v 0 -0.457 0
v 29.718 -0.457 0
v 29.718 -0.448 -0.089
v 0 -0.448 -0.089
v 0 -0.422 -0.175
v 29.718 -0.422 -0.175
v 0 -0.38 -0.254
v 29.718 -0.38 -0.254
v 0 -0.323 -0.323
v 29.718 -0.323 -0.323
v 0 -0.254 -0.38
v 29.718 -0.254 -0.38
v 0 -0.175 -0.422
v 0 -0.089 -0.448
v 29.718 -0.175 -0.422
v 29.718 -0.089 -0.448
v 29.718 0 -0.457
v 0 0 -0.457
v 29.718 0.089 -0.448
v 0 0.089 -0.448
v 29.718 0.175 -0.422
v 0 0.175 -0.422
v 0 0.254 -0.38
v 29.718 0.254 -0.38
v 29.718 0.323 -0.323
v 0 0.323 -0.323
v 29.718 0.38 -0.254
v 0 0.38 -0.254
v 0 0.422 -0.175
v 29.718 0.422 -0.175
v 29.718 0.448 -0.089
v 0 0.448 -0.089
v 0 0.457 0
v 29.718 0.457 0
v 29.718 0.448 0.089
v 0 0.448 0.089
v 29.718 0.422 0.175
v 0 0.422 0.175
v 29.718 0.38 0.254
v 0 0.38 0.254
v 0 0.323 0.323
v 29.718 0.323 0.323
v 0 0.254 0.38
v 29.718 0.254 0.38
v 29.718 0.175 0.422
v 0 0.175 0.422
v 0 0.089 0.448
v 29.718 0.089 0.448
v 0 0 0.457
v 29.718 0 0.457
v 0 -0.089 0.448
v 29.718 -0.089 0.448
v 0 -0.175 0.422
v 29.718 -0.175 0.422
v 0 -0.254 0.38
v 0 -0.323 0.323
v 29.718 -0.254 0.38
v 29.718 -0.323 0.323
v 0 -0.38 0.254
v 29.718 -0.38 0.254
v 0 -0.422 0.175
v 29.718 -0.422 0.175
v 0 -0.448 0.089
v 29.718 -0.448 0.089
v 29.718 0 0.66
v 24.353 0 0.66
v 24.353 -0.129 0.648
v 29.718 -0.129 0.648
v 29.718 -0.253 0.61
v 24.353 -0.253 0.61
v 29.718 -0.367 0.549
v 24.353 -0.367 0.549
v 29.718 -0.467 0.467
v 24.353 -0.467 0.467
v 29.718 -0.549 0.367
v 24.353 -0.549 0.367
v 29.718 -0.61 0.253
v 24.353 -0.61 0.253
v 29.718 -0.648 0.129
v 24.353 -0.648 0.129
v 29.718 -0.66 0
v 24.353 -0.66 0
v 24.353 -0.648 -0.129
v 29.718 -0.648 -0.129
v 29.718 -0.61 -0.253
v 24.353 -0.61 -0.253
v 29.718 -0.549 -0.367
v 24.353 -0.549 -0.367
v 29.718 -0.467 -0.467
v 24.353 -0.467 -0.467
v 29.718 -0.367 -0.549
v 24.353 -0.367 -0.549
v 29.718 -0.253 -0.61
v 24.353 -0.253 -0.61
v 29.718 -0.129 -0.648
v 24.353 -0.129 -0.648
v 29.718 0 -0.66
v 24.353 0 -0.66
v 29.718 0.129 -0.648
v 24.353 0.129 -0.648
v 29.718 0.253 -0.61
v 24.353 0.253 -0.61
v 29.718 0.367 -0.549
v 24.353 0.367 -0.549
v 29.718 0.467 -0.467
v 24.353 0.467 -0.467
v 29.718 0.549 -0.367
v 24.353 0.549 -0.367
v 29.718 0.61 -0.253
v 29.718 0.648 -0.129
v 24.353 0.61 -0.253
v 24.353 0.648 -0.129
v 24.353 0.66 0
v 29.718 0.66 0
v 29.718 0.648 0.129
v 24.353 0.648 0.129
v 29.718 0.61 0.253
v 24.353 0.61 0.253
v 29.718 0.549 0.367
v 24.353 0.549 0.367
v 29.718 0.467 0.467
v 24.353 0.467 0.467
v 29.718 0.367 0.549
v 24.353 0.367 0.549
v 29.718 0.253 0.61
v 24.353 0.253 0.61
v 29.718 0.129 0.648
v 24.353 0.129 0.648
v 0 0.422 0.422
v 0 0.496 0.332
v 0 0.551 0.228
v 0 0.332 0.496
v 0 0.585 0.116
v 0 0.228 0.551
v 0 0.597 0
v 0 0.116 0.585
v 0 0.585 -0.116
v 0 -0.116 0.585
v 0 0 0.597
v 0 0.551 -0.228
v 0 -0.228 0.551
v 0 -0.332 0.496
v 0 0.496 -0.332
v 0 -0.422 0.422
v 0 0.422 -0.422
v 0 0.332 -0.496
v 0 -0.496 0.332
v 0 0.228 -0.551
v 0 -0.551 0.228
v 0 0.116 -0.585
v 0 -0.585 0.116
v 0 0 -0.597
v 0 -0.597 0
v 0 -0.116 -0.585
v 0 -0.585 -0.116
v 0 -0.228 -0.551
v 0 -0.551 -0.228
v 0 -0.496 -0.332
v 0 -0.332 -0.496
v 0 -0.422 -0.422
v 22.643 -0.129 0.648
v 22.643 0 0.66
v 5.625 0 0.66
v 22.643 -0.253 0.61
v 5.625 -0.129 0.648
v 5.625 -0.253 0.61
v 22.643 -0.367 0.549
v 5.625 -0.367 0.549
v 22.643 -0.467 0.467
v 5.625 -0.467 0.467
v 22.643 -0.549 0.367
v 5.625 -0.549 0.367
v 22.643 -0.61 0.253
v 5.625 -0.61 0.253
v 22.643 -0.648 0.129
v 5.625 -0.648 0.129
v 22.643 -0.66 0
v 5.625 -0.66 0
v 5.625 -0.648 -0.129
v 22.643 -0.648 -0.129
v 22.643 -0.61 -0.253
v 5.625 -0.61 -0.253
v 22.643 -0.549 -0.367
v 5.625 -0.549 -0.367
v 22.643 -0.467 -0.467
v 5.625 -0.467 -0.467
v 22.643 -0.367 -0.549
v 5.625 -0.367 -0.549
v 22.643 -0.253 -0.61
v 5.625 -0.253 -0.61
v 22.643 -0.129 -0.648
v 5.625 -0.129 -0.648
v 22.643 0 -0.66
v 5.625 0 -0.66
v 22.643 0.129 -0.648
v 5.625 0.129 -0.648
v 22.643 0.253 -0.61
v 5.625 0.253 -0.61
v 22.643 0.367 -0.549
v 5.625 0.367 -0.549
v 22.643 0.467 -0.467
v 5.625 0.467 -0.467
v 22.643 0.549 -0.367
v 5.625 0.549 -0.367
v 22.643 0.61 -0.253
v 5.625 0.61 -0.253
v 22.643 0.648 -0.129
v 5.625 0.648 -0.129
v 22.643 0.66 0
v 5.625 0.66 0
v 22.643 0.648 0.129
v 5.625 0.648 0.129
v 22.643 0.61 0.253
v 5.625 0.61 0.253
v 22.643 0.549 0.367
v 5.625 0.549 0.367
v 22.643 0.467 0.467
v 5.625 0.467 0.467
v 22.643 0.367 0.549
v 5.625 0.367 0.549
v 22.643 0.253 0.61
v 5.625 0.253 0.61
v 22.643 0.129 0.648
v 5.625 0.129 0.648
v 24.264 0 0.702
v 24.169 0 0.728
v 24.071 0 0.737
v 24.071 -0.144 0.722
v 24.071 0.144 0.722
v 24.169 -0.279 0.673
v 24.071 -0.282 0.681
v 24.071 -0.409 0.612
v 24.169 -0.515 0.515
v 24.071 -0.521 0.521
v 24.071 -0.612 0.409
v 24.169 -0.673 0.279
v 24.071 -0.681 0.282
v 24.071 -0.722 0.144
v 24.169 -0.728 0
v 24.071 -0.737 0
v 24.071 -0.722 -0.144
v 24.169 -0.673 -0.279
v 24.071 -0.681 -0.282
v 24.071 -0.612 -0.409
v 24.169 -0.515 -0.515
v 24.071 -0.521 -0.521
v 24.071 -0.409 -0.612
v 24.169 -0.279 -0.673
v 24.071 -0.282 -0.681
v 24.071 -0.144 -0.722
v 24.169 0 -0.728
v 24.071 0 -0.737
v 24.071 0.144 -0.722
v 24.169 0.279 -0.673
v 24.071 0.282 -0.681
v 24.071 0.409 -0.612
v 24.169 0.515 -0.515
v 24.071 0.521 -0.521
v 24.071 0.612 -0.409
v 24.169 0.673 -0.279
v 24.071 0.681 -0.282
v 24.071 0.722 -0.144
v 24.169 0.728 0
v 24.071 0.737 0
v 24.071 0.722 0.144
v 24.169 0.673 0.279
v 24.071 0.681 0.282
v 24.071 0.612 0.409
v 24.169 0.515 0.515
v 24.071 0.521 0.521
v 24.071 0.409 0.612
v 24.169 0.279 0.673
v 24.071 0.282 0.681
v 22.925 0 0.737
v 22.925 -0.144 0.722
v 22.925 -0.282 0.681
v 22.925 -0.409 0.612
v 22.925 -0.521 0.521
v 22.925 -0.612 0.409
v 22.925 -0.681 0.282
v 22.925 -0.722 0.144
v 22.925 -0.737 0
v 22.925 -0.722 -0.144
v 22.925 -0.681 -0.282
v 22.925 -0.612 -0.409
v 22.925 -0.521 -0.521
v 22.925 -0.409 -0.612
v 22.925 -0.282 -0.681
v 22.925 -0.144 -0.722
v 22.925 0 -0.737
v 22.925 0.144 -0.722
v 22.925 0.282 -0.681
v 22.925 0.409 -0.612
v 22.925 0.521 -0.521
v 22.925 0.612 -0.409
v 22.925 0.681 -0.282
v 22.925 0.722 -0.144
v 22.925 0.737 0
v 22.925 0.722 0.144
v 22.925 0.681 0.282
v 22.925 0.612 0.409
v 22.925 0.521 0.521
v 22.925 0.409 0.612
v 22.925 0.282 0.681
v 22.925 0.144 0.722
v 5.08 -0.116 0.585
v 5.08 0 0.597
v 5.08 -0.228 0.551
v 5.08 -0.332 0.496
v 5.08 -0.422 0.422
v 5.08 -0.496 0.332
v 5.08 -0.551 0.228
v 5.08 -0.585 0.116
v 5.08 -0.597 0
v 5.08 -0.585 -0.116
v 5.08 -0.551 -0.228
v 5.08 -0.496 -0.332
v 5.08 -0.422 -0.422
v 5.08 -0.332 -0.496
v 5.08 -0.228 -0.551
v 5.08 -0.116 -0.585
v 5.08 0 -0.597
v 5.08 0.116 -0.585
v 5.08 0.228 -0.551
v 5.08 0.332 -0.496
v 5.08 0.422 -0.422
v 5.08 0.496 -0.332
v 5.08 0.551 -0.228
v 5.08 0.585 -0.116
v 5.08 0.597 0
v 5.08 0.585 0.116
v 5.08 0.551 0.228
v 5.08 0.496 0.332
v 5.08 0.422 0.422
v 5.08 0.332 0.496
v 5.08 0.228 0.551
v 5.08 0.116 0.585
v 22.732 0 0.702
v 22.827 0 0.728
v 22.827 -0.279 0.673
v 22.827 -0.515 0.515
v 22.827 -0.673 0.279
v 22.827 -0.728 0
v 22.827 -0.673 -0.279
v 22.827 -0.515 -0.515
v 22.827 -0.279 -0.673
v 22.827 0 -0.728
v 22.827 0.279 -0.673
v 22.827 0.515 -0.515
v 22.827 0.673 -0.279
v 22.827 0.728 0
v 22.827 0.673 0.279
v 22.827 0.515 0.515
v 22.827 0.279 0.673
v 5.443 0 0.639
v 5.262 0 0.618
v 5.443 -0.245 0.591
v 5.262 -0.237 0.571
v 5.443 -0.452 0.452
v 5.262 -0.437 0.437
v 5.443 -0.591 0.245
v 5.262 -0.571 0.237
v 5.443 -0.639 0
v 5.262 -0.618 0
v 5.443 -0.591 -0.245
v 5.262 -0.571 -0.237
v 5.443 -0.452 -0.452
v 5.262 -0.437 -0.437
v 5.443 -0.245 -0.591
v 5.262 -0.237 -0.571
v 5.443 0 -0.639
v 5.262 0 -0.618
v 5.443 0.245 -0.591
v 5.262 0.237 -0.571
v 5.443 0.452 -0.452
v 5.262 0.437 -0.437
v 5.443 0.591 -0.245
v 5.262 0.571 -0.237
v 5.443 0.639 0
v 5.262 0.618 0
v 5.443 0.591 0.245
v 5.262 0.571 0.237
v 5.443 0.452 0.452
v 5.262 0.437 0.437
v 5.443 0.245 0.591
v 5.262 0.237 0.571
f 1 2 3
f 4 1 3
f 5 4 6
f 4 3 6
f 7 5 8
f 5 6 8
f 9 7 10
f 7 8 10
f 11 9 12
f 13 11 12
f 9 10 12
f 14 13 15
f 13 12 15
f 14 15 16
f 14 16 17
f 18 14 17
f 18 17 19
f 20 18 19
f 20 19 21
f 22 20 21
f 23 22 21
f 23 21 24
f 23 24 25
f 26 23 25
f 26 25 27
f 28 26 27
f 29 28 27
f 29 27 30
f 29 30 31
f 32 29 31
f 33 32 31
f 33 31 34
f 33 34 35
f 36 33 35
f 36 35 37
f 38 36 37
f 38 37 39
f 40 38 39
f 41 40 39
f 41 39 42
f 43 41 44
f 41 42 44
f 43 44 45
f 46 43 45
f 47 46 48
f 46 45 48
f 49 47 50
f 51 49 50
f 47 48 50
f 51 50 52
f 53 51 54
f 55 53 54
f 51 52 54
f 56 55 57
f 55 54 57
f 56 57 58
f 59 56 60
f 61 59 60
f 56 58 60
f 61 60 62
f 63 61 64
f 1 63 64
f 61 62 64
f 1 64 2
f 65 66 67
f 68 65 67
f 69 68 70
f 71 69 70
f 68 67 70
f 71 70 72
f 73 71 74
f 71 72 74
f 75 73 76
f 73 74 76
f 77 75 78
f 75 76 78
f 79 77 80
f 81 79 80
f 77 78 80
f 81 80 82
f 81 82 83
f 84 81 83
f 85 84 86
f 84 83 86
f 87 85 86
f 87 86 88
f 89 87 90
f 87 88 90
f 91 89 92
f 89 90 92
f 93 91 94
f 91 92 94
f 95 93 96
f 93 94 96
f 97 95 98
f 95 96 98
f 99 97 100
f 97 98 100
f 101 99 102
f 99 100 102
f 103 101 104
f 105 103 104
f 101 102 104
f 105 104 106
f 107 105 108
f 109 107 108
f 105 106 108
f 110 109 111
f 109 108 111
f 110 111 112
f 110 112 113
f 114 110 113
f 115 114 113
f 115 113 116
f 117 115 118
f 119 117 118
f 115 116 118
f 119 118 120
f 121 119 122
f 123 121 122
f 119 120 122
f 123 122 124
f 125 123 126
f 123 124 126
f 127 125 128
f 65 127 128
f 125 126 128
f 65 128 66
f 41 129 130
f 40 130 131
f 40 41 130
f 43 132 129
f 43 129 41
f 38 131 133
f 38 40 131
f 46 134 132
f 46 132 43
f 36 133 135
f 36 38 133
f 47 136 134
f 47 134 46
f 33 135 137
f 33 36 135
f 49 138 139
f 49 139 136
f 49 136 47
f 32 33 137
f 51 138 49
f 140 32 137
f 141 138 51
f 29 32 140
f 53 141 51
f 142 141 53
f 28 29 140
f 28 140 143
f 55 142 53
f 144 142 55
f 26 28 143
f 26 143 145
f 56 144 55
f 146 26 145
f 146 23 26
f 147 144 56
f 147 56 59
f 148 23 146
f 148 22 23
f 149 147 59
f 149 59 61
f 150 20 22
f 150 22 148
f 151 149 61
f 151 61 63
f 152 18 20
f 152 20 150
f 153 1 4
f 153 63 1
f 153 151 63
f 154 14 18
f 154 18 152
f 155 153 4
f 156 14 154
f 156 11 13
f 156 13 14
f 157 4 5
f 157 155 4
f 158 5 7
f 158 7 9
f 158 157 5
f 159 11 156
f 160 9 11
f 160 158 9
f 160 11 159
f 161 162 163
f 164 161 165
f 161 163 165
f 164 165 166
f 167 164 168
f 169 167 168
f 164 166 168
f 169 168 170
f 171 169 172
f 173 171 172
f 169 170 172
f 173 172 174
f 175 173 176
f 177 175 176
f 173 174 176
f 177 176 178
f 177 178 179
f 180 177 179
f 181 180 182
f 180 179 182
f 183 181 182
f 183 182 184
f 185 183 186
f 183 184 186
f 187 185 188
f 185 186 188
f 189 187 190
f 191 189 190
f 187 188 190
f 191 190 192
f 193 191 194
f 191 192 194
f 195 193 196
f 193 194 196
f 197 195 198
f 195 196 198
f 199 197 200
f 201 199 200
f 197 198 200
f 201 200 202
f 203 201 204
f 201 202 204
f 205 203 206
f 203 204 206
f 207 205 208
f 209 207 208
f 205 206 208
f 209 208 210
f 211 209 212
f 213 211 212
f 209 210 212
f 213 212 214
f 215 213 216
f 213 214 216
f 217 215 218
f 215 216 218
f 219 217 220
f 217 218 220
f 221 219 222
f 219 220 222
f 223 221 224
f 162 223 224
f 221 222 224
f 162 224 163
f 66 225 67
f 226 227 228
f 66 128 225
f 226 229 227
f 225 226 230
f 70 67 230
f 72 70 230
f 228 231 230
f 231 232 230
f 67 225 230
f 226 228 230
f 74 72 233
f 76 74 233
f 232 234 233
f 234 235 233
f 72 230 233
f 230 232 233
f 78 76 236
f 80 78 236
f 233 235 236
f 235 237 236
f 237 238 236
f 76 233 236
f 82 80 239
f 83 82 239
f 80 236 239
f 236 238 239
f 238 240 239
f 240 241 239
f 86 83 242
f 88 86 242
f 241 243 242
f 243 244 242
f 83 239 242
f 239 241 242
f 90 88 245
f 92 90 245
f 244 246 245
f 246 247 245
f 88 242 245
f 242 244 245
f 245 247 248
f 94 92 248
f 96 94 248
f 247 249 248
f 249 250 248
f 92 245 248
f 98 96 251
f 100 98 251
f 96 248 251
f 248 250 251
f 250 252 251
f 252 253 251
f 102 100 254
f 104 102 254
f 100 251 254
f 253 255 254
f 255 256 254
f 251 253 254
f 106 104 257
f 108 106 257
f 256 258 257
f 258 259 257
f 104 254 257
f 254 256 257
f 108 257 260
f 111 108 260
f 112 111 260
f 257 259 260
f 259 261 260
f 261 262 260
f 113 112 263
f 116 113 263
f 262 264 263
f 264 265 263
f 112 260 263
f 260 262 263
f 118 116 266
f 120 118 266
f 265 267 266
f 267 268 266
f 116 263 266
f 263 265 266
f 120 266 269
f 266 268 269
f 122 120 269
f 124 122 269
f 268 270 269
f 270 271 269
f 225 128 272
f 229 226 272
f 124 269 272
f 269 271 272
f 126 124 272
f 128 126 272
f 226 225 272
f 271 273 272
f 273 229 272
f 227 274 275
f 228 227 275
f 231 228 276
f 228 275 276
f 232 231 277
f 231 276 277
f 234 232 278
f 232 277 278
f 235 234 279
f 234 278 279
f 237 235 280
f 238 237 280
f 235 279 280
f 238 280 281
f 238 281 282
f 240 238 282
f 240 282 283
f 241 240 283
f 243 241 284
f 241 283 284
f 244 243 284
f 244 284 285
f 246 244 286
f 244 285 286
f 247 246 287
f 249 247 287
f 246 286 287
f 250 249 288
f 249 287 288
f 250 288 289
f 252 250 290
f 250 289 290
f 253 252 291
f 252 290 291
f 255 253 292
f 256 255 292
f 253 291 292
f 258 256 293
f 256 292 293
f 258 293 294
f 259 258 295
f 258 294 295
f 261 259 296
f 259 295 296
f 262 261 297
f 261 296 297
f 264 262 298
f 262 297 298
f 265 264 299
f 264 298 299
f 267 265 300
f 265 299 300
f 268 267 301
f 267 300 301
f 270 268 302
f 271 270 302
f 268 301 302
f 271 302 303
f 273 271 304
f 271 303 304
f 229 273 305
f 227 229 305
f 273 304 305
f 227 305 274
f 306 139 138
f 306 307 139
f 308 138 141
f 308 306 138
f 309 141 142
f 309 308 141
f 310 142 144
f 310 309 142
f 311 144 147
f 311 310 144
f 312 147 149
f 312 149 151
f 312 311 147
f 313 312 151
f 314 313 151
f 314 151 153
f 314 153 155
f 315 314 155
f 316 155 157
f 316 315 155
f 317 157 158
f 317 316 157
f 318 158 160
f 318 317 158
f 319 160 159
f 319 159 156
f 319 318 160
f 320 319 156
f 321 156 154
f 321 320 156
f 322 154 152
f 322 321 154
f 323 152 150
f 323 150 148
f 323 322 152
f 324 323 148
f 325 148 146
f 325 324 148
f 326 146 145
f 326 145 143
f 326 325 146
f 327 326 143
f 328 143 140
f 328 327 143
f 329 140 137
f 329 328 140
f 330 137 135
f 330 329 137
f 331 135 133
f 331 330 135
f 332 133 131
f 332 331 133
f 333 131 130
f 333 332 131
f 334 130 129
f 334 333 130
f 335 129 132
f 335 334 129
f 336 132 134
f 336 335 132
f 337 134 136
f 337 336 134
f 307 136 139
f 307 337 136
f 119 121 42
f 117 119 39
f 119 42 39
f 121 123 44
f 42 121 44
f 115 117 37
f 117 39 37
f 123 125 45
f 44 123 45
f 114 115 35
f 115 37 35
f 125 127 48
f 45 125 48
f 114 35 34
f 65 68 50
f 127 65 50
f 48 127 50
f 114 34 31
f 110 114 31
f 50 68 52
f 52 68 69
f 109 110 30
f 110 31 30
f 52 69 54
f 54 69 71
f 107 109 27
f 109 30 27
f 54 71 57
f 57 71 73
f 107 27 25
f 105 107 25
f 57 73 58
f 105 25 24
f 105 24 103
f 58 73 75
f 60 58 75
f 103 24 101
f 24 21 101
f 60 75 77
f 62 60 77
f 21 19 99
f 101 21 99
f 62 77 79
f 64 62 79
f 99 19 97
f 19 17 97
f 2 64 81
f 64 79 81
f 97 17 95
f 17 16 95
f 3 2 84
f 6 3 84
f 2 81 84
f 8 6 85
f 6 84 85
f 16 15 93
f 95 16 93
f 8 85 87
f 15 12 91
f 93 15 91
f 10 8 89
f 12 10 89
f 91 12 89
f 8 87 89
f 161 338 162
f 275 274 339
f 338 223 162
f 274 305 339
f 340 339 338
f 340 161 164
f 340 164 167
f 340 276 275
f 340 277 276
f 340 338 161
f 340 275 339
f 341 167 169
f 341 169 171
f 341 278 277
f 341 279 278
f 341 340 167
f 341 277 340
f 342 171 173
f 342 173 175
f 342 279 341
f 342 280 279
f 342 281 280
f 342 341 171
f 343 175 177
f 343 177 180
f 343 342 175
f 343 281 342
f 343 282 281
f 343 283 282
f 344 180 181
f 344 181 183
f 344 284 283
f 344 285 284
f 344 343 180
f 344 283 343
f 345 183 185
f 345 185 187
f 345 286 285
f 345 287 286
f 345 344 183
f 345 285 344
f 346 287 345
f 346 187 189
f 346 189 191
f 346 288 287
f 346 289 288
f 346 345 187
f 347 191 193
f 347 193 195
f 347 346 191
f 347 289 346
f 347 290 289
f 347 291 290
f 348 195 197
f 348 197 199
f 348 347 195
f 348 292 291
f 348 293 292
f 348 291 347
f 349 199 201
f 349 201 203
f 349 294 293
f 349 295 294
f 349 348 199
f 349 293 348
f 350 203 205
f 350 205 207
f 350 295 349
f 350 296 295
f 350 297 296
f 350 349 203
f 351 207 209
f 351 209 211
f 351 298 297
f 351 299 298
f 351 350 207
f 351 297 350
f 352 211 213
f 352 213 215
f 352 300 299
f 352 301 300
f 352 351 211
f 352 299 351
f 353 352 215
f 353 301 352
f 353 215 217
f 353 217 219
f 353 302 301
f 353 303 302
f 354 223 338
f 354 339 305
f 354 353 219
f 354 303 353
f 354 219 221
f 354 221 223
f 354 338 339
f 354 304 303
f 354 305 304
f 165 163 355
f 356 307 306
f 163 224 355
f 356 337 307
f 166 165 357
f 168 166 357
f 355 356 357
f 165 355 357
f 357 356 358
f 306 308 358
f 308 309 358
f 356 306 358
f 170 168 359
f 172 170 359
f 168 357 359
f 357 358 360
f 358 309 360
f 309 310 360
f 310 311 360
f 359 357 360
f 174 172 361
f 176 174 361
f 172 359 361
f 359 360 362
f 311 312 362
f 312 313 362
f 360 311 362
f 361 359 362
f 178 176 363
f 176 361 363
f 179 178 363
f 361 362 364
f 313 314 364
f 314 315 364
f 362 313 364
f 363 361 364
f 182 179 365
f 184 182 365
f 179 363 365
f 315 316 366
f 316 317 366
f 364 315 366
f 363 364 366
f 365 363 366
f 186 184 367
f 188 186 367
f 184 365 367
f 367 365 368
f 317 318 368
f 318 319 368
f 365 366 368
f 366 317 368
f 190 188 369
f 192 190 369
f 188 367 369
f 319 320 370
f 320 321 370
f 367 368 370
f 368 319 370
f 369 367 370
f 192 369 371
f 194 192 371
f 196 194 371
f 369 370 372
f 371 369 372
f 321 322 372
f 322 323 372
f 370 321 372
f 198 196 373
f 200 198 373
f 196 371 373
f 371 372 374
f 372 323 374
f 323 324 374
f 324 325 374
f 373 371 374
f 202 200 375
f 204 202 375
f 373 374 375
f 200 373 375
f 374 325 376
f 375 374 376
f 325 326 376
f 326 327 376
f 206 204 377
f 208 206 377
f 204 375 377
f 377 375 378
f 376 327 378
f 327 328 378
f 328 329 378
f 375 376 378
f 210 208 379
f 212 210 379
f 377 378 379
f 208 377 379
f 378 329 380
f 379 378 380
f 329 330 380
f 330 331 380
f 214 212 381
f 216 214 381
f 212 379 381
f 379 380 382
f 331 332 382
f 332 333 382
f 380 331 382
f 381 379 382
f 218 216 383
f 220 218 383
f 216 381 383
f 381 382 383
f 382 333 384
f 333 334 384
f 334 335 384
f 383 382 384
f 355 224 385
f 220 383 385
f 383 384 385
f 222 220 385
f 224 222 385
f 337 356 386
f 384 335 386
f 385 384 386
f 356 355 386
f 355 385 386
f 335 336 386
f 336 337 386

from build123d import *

# Parameters (mm, degrees)
F0_W = 5.08
F0_H = 0.5969
F3_D = 0.9144


# Not quite as in the source:
# - a fillet or chamfer that OpenCascade refuses, or shapes differently, is made with other operations: its cross-section is extruded or revolved along the edge and cut away or added


with BuildPart() as f1:
    # F0 (on Front) → F1 (revolve)
    with BuildSketch(Plane.XZ):
        with Locations((2.54, 0.29845)):
            Rectangle(F0_W, F0_H)
        Polygon((5.6251967326, 0.6604), (5.6251967326, 0), (29.718, 0), (29.718, 0.6604), (24.3530571461, 0.6604), (24.3530571461, 0.7366), (22.6445570588, 0.7366), (22.6431967326, 0.6604), align=None)
        Polygon((5.08, 0.5969), (5.08, 0), (5.6251967326, 0), (5.6251967326, 0.6604), align=None)
    revolve(axis=Axis((14.859, 0, 0), (1, 0, 0)))

    # F3 (through all)
    with Locations(Plane(origin=(0, 0, 0), x_dir=(0, 1, 0), z_dir=(-1, 0, 0))):
        with Locations((0, 0)):
            Hole(F3_D / 2)

    # F4: fillet of radius 0.5588 on 1 edges, made by hand

    # F4_s1 → F4_t2 (revolve, cut)
    with BuildSketch(Plane.XZ):
        with BuildLine():
            ThreePointArc((24.3530571461, 0.6604), (24.21726941, 0.7172137188), (24.0713575188, 0.7366))
            Line((24.0713575188, 0.7366), (24.3530571461, 0.7366))
            Line((24.3530571461, 0.7366), (24.3530571461, 0.6604))
        make_face()
    revolve(axis=Axis((24.3530571461, 0, 0), (1, 0, 0)), mode=Mode.SUBTRACT)

    # F5: fillet of radius 0.5588 on 1 edges, made by hand

    # F5_s1 → F5_t2 (revolve, cut)
    with BuildSketch(Plane.XZ):
        with BuildLine():
            ThreePointArc((22.6431967326, 0.6604), (22.7789844686, 0.7172137188), (22.9248963599, 0.7366))
            Line((22.9248963599, 0.7366), (22.6445570588, 0.7366))
            Line((22.6445570588, 0.7366), (22.6431967326, 0.6604))
        make_face()
    revolve(axis=Axis((22.6445570588, 0, 0), (1, 0, 0)), mode=Mode.SUBTRACT)


solid = f1.part
